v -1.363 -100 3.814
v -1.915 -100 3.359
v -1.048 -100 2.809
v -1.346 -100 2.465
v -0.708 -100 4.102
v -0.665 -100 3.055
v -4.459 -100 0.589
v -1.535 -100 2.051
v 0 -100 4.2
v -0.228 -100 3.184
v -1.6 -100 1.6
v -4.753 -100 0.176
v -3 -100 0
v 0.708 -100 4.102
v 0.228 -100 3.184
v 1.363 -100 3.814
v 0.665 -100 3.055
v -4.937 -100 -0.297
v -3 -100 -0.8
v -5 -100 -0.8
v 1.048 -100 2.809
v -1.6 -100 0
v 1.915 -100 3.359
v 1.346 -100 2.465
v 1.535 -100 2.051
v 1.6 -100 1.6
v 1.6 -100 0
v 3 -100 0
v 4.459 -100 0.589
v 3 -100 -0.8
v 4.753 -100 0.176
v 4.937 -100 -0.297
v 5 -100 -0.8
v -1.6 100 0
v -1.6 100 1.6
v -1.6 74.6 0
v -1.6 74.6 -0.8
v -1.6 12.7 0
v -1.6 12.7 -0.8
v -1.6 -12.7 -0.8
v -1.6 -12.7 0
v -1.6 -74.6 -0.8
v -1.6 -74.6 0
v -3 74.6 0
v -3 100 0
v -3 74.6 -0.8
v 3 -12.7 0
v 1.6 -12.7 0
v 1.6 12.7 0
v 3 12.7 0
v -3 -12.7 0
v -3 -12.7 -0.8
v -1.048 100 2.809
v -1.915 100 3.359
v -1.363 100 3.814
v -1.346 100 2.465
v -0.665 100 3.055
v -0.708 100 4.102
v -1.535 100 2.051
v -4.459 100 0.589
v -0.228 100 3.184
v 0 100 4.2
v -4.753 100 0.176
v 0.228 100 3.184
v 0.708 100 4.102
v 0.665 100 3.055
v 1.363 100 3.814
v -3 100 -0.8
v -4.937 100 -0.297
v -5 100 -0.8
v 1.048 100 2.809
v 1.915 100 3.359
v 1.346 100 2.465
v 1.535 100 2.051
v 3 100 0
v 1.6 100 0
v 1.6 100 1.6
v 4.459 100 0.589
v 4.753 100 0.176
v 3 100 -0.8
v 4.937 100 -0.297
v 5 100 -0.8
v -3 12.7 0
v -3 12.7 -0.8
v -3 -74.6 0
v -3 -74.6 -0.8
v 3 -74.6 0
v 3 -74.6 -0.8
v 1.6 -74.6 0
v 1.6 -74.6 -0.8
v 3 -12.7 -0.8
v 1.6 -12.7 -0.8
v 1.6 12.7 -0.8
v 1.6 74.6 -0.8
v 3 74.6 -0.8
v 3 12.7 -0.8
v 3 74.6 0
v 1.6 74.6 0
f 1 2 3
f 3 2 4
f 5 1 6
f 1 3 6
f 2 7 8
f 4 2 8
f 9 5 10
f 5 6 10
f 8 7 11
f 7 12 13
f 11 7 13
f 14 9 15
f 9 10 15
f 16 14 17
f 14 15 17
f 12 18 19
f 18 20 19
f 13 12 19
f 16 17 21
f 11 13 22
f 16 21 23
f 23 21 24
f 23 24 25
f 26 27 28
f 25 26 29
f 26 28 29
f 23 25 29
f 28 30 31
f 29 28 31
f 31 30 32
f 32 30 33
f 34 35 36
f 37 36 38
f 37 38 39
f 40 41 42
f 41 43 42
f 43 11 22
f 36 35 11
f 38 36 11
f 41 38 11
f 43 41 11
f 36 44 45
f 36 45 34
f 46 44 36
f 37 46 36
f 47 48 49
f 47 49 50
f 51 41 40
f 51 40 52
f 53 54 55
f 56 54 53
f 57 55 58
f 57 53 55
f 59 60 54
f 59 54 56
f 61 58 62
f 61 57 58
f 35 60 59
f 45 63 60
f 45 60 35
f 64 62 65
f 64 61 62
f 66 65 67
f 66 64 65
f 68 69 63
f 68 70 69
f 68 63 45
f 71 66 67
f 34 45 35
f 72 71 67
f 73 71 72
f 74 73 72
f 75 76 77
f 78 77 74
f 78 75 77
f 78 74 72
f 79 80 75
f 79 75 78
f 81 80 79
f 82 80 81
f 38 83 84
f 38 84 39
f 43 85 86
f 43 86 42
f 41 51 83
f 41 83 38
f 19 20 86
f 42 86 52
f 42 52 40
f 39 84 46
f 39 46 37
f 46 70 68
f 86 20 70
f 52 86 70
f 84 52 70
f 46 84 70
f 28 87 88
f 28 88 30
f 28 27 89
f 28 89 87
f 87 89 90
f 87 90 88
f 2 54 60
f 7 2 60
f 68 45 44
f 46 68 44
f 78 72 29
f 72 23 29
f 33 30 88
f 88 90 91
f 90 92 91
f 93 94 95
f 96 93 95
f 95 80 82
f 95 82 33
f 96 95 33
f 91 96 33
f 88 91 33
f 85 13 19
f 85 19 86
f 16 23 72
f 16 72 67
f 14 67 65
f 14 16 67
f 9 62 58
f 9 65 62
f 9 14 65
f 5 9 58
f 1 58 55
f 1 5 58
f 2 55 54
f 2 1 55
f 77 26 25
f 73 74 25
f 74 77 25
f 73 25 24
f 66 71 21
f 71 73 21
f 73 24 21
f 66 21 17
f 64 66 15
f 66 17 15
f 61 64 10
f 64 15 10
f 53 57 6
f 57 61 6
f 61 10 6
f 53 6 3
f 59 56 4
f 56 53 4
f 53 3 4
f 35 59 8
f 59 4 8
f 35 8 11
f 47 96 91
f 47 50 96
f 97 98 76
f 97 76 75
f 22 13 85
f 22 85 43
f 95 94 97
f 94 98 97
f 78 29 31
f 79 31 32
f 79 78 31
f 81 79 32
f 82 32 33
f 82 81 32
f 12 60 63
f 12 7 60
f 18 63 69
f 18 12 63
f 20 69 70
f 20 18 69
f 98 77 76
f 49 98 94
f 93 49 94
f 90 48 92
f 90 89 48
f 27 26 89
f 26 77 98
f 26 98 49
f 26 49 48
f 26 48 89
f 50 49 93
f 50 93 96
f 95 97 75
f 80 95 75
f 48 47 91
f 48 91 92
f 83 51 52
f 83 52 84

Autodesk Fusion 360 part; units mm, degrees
sketch "Sketch1" plane through (0, 0, 0) normal (0, 1, 0) x (1, 0, 0) in component "Main"
  arc A0 (-1.9148, -3.3588) -> (1.9148, -3.3588) centre (0, -1.6) ccw
  line L0 (-1.9148, -3.3588) -> (-5, 0)
  line L1 (1.9148, -3.3588) -> (5, 0)
  line L2 (-5, 0) -> (5, 0)
  line L3 (0, -1.6) -> (0, 0) construction
  circle A1 centre (0, -1.6) radius 1.5 construction
  arc A2 (-1.6, -1.6) -> (1.6, -1.6) centre (0, -1.6) ccw
  line L4 (-1.6, -1.6) -> (-1.6, 0)
  line L5 (1.6, -1.6) -> (1.6, 0)
  point P0 (0, -0.1)
  dimension "d3" = 0.1
  dimension "d4" = 3
  dimension "d5" = 0.1
  dimension "d6" = 1
  dimension "d7" = 85.137
  dimension "d12" = 10
extrude "Extrude1" add sketch "Sketch1" along normal mid plane 200 contours A0 L0 L1 L2 A2 L4 L5 in component "Main"
sketch "Sketch2" plane through (0, 0, 0) normal (0, 0, 1) x (1, 0, 0) in component "Main"
  line L0 (-5, -100) -> (-5, 100)
  line L1 (5, -100) -> (5, 100)
  line L2 (3, -100) -> (-3, -100)
  line L3 (-3, -100) -> (-3, -74.6)
  line L4 (-3, -74.6) -> (3, -74.6)
  line L5 (3, -74.6) -> (3, -100)
  line L6 (-5, -100) -> (3, -74.6) construction
  line L7 (5, -100) -> (-3, -74.6) construction
  line L8 (3, 100) -> (-3, 100)
  line L9 (-3, 100) -> (-3, 74.6)
  line L10 (-3, 74.6) -> (3, 74.6)
  line L11 (3, 74.6) -> (3, 100)
  line L12 (3, -12.7) -> (-3, -12.7)
  line L13 (-3, -12.7) -> (-3, 12.7)
  line L14 (-3, 12.7) -> (3, 12.7)
  line L15 (3, 12.7) -> (3, -12.7)
  line L16 (3, 0) -> (-3, 0) construction
  line L17 (-5, -100) -> (-3, -100)
  line L18 (5, -100) -> (3, -100)
  line L19 (5, 100) -> (3, 100)
  line L20 (-3, 100) -> (-5, 100)
  line L21 (1.6, -100) -> (1.6, 100)
  line L22 (-1.6, -100) -> (-1.6, 100)
  dimension "d17" = 25.4
  dimension "d18" = 2
  dimension "d19" = 25.4
  dimension "d20" = 25.4
extrude "Extrude2" add sketch "Sketch2" against normal blind 0.8 contours L0 L3 L4 L9 L10 L12 L13 L14 L17 L20 L22 | L1 L4 L5 L10 L11 L12 L14 L15 L18 L19 L21 in component "Main"
sketch "Sketch3" plane through (0, 0, 0) normal (0, 1, 0) x (1, 0, 0) in component "Main"
  line L0 (-5, 0) -> (-1.9148, -3.3588)
  line L1 (-5, 0.8) -> (-5, 0)
  arc A0 (-5, 0.8) -> (-4.4588, -0.5892) centre (-2.9464, 0.8) ccw
  line L2 (-5, 0.8) -> (-3, 0.8)
  dimension "d23" = 2.0536
fillet "Fillet1" radius 2.0536 2 edges at (-5, 0, 0) (5, 0, 0) in component "Main"
split "Split1" [suppressed] in component "Main"
extrude "Extrude3" [suppressed] in component "Main"
component "Main" placed x (1, 0, 0) y (0, 1, 0) z (0, 0, 1) at (0, 0, 0)
equation "d4 = CableDiameter"
equation "CableDiameter = 3 mm"
equation "BotWidth = 10 mm"
equation "d12 = BotWidth"
equation "GapWidth = 25.4 mm"
equation "d17 = GapWidth"
equation "d19 = GapWidth"
equation "d20 = GapWidth"
equation "d25 = d23"
